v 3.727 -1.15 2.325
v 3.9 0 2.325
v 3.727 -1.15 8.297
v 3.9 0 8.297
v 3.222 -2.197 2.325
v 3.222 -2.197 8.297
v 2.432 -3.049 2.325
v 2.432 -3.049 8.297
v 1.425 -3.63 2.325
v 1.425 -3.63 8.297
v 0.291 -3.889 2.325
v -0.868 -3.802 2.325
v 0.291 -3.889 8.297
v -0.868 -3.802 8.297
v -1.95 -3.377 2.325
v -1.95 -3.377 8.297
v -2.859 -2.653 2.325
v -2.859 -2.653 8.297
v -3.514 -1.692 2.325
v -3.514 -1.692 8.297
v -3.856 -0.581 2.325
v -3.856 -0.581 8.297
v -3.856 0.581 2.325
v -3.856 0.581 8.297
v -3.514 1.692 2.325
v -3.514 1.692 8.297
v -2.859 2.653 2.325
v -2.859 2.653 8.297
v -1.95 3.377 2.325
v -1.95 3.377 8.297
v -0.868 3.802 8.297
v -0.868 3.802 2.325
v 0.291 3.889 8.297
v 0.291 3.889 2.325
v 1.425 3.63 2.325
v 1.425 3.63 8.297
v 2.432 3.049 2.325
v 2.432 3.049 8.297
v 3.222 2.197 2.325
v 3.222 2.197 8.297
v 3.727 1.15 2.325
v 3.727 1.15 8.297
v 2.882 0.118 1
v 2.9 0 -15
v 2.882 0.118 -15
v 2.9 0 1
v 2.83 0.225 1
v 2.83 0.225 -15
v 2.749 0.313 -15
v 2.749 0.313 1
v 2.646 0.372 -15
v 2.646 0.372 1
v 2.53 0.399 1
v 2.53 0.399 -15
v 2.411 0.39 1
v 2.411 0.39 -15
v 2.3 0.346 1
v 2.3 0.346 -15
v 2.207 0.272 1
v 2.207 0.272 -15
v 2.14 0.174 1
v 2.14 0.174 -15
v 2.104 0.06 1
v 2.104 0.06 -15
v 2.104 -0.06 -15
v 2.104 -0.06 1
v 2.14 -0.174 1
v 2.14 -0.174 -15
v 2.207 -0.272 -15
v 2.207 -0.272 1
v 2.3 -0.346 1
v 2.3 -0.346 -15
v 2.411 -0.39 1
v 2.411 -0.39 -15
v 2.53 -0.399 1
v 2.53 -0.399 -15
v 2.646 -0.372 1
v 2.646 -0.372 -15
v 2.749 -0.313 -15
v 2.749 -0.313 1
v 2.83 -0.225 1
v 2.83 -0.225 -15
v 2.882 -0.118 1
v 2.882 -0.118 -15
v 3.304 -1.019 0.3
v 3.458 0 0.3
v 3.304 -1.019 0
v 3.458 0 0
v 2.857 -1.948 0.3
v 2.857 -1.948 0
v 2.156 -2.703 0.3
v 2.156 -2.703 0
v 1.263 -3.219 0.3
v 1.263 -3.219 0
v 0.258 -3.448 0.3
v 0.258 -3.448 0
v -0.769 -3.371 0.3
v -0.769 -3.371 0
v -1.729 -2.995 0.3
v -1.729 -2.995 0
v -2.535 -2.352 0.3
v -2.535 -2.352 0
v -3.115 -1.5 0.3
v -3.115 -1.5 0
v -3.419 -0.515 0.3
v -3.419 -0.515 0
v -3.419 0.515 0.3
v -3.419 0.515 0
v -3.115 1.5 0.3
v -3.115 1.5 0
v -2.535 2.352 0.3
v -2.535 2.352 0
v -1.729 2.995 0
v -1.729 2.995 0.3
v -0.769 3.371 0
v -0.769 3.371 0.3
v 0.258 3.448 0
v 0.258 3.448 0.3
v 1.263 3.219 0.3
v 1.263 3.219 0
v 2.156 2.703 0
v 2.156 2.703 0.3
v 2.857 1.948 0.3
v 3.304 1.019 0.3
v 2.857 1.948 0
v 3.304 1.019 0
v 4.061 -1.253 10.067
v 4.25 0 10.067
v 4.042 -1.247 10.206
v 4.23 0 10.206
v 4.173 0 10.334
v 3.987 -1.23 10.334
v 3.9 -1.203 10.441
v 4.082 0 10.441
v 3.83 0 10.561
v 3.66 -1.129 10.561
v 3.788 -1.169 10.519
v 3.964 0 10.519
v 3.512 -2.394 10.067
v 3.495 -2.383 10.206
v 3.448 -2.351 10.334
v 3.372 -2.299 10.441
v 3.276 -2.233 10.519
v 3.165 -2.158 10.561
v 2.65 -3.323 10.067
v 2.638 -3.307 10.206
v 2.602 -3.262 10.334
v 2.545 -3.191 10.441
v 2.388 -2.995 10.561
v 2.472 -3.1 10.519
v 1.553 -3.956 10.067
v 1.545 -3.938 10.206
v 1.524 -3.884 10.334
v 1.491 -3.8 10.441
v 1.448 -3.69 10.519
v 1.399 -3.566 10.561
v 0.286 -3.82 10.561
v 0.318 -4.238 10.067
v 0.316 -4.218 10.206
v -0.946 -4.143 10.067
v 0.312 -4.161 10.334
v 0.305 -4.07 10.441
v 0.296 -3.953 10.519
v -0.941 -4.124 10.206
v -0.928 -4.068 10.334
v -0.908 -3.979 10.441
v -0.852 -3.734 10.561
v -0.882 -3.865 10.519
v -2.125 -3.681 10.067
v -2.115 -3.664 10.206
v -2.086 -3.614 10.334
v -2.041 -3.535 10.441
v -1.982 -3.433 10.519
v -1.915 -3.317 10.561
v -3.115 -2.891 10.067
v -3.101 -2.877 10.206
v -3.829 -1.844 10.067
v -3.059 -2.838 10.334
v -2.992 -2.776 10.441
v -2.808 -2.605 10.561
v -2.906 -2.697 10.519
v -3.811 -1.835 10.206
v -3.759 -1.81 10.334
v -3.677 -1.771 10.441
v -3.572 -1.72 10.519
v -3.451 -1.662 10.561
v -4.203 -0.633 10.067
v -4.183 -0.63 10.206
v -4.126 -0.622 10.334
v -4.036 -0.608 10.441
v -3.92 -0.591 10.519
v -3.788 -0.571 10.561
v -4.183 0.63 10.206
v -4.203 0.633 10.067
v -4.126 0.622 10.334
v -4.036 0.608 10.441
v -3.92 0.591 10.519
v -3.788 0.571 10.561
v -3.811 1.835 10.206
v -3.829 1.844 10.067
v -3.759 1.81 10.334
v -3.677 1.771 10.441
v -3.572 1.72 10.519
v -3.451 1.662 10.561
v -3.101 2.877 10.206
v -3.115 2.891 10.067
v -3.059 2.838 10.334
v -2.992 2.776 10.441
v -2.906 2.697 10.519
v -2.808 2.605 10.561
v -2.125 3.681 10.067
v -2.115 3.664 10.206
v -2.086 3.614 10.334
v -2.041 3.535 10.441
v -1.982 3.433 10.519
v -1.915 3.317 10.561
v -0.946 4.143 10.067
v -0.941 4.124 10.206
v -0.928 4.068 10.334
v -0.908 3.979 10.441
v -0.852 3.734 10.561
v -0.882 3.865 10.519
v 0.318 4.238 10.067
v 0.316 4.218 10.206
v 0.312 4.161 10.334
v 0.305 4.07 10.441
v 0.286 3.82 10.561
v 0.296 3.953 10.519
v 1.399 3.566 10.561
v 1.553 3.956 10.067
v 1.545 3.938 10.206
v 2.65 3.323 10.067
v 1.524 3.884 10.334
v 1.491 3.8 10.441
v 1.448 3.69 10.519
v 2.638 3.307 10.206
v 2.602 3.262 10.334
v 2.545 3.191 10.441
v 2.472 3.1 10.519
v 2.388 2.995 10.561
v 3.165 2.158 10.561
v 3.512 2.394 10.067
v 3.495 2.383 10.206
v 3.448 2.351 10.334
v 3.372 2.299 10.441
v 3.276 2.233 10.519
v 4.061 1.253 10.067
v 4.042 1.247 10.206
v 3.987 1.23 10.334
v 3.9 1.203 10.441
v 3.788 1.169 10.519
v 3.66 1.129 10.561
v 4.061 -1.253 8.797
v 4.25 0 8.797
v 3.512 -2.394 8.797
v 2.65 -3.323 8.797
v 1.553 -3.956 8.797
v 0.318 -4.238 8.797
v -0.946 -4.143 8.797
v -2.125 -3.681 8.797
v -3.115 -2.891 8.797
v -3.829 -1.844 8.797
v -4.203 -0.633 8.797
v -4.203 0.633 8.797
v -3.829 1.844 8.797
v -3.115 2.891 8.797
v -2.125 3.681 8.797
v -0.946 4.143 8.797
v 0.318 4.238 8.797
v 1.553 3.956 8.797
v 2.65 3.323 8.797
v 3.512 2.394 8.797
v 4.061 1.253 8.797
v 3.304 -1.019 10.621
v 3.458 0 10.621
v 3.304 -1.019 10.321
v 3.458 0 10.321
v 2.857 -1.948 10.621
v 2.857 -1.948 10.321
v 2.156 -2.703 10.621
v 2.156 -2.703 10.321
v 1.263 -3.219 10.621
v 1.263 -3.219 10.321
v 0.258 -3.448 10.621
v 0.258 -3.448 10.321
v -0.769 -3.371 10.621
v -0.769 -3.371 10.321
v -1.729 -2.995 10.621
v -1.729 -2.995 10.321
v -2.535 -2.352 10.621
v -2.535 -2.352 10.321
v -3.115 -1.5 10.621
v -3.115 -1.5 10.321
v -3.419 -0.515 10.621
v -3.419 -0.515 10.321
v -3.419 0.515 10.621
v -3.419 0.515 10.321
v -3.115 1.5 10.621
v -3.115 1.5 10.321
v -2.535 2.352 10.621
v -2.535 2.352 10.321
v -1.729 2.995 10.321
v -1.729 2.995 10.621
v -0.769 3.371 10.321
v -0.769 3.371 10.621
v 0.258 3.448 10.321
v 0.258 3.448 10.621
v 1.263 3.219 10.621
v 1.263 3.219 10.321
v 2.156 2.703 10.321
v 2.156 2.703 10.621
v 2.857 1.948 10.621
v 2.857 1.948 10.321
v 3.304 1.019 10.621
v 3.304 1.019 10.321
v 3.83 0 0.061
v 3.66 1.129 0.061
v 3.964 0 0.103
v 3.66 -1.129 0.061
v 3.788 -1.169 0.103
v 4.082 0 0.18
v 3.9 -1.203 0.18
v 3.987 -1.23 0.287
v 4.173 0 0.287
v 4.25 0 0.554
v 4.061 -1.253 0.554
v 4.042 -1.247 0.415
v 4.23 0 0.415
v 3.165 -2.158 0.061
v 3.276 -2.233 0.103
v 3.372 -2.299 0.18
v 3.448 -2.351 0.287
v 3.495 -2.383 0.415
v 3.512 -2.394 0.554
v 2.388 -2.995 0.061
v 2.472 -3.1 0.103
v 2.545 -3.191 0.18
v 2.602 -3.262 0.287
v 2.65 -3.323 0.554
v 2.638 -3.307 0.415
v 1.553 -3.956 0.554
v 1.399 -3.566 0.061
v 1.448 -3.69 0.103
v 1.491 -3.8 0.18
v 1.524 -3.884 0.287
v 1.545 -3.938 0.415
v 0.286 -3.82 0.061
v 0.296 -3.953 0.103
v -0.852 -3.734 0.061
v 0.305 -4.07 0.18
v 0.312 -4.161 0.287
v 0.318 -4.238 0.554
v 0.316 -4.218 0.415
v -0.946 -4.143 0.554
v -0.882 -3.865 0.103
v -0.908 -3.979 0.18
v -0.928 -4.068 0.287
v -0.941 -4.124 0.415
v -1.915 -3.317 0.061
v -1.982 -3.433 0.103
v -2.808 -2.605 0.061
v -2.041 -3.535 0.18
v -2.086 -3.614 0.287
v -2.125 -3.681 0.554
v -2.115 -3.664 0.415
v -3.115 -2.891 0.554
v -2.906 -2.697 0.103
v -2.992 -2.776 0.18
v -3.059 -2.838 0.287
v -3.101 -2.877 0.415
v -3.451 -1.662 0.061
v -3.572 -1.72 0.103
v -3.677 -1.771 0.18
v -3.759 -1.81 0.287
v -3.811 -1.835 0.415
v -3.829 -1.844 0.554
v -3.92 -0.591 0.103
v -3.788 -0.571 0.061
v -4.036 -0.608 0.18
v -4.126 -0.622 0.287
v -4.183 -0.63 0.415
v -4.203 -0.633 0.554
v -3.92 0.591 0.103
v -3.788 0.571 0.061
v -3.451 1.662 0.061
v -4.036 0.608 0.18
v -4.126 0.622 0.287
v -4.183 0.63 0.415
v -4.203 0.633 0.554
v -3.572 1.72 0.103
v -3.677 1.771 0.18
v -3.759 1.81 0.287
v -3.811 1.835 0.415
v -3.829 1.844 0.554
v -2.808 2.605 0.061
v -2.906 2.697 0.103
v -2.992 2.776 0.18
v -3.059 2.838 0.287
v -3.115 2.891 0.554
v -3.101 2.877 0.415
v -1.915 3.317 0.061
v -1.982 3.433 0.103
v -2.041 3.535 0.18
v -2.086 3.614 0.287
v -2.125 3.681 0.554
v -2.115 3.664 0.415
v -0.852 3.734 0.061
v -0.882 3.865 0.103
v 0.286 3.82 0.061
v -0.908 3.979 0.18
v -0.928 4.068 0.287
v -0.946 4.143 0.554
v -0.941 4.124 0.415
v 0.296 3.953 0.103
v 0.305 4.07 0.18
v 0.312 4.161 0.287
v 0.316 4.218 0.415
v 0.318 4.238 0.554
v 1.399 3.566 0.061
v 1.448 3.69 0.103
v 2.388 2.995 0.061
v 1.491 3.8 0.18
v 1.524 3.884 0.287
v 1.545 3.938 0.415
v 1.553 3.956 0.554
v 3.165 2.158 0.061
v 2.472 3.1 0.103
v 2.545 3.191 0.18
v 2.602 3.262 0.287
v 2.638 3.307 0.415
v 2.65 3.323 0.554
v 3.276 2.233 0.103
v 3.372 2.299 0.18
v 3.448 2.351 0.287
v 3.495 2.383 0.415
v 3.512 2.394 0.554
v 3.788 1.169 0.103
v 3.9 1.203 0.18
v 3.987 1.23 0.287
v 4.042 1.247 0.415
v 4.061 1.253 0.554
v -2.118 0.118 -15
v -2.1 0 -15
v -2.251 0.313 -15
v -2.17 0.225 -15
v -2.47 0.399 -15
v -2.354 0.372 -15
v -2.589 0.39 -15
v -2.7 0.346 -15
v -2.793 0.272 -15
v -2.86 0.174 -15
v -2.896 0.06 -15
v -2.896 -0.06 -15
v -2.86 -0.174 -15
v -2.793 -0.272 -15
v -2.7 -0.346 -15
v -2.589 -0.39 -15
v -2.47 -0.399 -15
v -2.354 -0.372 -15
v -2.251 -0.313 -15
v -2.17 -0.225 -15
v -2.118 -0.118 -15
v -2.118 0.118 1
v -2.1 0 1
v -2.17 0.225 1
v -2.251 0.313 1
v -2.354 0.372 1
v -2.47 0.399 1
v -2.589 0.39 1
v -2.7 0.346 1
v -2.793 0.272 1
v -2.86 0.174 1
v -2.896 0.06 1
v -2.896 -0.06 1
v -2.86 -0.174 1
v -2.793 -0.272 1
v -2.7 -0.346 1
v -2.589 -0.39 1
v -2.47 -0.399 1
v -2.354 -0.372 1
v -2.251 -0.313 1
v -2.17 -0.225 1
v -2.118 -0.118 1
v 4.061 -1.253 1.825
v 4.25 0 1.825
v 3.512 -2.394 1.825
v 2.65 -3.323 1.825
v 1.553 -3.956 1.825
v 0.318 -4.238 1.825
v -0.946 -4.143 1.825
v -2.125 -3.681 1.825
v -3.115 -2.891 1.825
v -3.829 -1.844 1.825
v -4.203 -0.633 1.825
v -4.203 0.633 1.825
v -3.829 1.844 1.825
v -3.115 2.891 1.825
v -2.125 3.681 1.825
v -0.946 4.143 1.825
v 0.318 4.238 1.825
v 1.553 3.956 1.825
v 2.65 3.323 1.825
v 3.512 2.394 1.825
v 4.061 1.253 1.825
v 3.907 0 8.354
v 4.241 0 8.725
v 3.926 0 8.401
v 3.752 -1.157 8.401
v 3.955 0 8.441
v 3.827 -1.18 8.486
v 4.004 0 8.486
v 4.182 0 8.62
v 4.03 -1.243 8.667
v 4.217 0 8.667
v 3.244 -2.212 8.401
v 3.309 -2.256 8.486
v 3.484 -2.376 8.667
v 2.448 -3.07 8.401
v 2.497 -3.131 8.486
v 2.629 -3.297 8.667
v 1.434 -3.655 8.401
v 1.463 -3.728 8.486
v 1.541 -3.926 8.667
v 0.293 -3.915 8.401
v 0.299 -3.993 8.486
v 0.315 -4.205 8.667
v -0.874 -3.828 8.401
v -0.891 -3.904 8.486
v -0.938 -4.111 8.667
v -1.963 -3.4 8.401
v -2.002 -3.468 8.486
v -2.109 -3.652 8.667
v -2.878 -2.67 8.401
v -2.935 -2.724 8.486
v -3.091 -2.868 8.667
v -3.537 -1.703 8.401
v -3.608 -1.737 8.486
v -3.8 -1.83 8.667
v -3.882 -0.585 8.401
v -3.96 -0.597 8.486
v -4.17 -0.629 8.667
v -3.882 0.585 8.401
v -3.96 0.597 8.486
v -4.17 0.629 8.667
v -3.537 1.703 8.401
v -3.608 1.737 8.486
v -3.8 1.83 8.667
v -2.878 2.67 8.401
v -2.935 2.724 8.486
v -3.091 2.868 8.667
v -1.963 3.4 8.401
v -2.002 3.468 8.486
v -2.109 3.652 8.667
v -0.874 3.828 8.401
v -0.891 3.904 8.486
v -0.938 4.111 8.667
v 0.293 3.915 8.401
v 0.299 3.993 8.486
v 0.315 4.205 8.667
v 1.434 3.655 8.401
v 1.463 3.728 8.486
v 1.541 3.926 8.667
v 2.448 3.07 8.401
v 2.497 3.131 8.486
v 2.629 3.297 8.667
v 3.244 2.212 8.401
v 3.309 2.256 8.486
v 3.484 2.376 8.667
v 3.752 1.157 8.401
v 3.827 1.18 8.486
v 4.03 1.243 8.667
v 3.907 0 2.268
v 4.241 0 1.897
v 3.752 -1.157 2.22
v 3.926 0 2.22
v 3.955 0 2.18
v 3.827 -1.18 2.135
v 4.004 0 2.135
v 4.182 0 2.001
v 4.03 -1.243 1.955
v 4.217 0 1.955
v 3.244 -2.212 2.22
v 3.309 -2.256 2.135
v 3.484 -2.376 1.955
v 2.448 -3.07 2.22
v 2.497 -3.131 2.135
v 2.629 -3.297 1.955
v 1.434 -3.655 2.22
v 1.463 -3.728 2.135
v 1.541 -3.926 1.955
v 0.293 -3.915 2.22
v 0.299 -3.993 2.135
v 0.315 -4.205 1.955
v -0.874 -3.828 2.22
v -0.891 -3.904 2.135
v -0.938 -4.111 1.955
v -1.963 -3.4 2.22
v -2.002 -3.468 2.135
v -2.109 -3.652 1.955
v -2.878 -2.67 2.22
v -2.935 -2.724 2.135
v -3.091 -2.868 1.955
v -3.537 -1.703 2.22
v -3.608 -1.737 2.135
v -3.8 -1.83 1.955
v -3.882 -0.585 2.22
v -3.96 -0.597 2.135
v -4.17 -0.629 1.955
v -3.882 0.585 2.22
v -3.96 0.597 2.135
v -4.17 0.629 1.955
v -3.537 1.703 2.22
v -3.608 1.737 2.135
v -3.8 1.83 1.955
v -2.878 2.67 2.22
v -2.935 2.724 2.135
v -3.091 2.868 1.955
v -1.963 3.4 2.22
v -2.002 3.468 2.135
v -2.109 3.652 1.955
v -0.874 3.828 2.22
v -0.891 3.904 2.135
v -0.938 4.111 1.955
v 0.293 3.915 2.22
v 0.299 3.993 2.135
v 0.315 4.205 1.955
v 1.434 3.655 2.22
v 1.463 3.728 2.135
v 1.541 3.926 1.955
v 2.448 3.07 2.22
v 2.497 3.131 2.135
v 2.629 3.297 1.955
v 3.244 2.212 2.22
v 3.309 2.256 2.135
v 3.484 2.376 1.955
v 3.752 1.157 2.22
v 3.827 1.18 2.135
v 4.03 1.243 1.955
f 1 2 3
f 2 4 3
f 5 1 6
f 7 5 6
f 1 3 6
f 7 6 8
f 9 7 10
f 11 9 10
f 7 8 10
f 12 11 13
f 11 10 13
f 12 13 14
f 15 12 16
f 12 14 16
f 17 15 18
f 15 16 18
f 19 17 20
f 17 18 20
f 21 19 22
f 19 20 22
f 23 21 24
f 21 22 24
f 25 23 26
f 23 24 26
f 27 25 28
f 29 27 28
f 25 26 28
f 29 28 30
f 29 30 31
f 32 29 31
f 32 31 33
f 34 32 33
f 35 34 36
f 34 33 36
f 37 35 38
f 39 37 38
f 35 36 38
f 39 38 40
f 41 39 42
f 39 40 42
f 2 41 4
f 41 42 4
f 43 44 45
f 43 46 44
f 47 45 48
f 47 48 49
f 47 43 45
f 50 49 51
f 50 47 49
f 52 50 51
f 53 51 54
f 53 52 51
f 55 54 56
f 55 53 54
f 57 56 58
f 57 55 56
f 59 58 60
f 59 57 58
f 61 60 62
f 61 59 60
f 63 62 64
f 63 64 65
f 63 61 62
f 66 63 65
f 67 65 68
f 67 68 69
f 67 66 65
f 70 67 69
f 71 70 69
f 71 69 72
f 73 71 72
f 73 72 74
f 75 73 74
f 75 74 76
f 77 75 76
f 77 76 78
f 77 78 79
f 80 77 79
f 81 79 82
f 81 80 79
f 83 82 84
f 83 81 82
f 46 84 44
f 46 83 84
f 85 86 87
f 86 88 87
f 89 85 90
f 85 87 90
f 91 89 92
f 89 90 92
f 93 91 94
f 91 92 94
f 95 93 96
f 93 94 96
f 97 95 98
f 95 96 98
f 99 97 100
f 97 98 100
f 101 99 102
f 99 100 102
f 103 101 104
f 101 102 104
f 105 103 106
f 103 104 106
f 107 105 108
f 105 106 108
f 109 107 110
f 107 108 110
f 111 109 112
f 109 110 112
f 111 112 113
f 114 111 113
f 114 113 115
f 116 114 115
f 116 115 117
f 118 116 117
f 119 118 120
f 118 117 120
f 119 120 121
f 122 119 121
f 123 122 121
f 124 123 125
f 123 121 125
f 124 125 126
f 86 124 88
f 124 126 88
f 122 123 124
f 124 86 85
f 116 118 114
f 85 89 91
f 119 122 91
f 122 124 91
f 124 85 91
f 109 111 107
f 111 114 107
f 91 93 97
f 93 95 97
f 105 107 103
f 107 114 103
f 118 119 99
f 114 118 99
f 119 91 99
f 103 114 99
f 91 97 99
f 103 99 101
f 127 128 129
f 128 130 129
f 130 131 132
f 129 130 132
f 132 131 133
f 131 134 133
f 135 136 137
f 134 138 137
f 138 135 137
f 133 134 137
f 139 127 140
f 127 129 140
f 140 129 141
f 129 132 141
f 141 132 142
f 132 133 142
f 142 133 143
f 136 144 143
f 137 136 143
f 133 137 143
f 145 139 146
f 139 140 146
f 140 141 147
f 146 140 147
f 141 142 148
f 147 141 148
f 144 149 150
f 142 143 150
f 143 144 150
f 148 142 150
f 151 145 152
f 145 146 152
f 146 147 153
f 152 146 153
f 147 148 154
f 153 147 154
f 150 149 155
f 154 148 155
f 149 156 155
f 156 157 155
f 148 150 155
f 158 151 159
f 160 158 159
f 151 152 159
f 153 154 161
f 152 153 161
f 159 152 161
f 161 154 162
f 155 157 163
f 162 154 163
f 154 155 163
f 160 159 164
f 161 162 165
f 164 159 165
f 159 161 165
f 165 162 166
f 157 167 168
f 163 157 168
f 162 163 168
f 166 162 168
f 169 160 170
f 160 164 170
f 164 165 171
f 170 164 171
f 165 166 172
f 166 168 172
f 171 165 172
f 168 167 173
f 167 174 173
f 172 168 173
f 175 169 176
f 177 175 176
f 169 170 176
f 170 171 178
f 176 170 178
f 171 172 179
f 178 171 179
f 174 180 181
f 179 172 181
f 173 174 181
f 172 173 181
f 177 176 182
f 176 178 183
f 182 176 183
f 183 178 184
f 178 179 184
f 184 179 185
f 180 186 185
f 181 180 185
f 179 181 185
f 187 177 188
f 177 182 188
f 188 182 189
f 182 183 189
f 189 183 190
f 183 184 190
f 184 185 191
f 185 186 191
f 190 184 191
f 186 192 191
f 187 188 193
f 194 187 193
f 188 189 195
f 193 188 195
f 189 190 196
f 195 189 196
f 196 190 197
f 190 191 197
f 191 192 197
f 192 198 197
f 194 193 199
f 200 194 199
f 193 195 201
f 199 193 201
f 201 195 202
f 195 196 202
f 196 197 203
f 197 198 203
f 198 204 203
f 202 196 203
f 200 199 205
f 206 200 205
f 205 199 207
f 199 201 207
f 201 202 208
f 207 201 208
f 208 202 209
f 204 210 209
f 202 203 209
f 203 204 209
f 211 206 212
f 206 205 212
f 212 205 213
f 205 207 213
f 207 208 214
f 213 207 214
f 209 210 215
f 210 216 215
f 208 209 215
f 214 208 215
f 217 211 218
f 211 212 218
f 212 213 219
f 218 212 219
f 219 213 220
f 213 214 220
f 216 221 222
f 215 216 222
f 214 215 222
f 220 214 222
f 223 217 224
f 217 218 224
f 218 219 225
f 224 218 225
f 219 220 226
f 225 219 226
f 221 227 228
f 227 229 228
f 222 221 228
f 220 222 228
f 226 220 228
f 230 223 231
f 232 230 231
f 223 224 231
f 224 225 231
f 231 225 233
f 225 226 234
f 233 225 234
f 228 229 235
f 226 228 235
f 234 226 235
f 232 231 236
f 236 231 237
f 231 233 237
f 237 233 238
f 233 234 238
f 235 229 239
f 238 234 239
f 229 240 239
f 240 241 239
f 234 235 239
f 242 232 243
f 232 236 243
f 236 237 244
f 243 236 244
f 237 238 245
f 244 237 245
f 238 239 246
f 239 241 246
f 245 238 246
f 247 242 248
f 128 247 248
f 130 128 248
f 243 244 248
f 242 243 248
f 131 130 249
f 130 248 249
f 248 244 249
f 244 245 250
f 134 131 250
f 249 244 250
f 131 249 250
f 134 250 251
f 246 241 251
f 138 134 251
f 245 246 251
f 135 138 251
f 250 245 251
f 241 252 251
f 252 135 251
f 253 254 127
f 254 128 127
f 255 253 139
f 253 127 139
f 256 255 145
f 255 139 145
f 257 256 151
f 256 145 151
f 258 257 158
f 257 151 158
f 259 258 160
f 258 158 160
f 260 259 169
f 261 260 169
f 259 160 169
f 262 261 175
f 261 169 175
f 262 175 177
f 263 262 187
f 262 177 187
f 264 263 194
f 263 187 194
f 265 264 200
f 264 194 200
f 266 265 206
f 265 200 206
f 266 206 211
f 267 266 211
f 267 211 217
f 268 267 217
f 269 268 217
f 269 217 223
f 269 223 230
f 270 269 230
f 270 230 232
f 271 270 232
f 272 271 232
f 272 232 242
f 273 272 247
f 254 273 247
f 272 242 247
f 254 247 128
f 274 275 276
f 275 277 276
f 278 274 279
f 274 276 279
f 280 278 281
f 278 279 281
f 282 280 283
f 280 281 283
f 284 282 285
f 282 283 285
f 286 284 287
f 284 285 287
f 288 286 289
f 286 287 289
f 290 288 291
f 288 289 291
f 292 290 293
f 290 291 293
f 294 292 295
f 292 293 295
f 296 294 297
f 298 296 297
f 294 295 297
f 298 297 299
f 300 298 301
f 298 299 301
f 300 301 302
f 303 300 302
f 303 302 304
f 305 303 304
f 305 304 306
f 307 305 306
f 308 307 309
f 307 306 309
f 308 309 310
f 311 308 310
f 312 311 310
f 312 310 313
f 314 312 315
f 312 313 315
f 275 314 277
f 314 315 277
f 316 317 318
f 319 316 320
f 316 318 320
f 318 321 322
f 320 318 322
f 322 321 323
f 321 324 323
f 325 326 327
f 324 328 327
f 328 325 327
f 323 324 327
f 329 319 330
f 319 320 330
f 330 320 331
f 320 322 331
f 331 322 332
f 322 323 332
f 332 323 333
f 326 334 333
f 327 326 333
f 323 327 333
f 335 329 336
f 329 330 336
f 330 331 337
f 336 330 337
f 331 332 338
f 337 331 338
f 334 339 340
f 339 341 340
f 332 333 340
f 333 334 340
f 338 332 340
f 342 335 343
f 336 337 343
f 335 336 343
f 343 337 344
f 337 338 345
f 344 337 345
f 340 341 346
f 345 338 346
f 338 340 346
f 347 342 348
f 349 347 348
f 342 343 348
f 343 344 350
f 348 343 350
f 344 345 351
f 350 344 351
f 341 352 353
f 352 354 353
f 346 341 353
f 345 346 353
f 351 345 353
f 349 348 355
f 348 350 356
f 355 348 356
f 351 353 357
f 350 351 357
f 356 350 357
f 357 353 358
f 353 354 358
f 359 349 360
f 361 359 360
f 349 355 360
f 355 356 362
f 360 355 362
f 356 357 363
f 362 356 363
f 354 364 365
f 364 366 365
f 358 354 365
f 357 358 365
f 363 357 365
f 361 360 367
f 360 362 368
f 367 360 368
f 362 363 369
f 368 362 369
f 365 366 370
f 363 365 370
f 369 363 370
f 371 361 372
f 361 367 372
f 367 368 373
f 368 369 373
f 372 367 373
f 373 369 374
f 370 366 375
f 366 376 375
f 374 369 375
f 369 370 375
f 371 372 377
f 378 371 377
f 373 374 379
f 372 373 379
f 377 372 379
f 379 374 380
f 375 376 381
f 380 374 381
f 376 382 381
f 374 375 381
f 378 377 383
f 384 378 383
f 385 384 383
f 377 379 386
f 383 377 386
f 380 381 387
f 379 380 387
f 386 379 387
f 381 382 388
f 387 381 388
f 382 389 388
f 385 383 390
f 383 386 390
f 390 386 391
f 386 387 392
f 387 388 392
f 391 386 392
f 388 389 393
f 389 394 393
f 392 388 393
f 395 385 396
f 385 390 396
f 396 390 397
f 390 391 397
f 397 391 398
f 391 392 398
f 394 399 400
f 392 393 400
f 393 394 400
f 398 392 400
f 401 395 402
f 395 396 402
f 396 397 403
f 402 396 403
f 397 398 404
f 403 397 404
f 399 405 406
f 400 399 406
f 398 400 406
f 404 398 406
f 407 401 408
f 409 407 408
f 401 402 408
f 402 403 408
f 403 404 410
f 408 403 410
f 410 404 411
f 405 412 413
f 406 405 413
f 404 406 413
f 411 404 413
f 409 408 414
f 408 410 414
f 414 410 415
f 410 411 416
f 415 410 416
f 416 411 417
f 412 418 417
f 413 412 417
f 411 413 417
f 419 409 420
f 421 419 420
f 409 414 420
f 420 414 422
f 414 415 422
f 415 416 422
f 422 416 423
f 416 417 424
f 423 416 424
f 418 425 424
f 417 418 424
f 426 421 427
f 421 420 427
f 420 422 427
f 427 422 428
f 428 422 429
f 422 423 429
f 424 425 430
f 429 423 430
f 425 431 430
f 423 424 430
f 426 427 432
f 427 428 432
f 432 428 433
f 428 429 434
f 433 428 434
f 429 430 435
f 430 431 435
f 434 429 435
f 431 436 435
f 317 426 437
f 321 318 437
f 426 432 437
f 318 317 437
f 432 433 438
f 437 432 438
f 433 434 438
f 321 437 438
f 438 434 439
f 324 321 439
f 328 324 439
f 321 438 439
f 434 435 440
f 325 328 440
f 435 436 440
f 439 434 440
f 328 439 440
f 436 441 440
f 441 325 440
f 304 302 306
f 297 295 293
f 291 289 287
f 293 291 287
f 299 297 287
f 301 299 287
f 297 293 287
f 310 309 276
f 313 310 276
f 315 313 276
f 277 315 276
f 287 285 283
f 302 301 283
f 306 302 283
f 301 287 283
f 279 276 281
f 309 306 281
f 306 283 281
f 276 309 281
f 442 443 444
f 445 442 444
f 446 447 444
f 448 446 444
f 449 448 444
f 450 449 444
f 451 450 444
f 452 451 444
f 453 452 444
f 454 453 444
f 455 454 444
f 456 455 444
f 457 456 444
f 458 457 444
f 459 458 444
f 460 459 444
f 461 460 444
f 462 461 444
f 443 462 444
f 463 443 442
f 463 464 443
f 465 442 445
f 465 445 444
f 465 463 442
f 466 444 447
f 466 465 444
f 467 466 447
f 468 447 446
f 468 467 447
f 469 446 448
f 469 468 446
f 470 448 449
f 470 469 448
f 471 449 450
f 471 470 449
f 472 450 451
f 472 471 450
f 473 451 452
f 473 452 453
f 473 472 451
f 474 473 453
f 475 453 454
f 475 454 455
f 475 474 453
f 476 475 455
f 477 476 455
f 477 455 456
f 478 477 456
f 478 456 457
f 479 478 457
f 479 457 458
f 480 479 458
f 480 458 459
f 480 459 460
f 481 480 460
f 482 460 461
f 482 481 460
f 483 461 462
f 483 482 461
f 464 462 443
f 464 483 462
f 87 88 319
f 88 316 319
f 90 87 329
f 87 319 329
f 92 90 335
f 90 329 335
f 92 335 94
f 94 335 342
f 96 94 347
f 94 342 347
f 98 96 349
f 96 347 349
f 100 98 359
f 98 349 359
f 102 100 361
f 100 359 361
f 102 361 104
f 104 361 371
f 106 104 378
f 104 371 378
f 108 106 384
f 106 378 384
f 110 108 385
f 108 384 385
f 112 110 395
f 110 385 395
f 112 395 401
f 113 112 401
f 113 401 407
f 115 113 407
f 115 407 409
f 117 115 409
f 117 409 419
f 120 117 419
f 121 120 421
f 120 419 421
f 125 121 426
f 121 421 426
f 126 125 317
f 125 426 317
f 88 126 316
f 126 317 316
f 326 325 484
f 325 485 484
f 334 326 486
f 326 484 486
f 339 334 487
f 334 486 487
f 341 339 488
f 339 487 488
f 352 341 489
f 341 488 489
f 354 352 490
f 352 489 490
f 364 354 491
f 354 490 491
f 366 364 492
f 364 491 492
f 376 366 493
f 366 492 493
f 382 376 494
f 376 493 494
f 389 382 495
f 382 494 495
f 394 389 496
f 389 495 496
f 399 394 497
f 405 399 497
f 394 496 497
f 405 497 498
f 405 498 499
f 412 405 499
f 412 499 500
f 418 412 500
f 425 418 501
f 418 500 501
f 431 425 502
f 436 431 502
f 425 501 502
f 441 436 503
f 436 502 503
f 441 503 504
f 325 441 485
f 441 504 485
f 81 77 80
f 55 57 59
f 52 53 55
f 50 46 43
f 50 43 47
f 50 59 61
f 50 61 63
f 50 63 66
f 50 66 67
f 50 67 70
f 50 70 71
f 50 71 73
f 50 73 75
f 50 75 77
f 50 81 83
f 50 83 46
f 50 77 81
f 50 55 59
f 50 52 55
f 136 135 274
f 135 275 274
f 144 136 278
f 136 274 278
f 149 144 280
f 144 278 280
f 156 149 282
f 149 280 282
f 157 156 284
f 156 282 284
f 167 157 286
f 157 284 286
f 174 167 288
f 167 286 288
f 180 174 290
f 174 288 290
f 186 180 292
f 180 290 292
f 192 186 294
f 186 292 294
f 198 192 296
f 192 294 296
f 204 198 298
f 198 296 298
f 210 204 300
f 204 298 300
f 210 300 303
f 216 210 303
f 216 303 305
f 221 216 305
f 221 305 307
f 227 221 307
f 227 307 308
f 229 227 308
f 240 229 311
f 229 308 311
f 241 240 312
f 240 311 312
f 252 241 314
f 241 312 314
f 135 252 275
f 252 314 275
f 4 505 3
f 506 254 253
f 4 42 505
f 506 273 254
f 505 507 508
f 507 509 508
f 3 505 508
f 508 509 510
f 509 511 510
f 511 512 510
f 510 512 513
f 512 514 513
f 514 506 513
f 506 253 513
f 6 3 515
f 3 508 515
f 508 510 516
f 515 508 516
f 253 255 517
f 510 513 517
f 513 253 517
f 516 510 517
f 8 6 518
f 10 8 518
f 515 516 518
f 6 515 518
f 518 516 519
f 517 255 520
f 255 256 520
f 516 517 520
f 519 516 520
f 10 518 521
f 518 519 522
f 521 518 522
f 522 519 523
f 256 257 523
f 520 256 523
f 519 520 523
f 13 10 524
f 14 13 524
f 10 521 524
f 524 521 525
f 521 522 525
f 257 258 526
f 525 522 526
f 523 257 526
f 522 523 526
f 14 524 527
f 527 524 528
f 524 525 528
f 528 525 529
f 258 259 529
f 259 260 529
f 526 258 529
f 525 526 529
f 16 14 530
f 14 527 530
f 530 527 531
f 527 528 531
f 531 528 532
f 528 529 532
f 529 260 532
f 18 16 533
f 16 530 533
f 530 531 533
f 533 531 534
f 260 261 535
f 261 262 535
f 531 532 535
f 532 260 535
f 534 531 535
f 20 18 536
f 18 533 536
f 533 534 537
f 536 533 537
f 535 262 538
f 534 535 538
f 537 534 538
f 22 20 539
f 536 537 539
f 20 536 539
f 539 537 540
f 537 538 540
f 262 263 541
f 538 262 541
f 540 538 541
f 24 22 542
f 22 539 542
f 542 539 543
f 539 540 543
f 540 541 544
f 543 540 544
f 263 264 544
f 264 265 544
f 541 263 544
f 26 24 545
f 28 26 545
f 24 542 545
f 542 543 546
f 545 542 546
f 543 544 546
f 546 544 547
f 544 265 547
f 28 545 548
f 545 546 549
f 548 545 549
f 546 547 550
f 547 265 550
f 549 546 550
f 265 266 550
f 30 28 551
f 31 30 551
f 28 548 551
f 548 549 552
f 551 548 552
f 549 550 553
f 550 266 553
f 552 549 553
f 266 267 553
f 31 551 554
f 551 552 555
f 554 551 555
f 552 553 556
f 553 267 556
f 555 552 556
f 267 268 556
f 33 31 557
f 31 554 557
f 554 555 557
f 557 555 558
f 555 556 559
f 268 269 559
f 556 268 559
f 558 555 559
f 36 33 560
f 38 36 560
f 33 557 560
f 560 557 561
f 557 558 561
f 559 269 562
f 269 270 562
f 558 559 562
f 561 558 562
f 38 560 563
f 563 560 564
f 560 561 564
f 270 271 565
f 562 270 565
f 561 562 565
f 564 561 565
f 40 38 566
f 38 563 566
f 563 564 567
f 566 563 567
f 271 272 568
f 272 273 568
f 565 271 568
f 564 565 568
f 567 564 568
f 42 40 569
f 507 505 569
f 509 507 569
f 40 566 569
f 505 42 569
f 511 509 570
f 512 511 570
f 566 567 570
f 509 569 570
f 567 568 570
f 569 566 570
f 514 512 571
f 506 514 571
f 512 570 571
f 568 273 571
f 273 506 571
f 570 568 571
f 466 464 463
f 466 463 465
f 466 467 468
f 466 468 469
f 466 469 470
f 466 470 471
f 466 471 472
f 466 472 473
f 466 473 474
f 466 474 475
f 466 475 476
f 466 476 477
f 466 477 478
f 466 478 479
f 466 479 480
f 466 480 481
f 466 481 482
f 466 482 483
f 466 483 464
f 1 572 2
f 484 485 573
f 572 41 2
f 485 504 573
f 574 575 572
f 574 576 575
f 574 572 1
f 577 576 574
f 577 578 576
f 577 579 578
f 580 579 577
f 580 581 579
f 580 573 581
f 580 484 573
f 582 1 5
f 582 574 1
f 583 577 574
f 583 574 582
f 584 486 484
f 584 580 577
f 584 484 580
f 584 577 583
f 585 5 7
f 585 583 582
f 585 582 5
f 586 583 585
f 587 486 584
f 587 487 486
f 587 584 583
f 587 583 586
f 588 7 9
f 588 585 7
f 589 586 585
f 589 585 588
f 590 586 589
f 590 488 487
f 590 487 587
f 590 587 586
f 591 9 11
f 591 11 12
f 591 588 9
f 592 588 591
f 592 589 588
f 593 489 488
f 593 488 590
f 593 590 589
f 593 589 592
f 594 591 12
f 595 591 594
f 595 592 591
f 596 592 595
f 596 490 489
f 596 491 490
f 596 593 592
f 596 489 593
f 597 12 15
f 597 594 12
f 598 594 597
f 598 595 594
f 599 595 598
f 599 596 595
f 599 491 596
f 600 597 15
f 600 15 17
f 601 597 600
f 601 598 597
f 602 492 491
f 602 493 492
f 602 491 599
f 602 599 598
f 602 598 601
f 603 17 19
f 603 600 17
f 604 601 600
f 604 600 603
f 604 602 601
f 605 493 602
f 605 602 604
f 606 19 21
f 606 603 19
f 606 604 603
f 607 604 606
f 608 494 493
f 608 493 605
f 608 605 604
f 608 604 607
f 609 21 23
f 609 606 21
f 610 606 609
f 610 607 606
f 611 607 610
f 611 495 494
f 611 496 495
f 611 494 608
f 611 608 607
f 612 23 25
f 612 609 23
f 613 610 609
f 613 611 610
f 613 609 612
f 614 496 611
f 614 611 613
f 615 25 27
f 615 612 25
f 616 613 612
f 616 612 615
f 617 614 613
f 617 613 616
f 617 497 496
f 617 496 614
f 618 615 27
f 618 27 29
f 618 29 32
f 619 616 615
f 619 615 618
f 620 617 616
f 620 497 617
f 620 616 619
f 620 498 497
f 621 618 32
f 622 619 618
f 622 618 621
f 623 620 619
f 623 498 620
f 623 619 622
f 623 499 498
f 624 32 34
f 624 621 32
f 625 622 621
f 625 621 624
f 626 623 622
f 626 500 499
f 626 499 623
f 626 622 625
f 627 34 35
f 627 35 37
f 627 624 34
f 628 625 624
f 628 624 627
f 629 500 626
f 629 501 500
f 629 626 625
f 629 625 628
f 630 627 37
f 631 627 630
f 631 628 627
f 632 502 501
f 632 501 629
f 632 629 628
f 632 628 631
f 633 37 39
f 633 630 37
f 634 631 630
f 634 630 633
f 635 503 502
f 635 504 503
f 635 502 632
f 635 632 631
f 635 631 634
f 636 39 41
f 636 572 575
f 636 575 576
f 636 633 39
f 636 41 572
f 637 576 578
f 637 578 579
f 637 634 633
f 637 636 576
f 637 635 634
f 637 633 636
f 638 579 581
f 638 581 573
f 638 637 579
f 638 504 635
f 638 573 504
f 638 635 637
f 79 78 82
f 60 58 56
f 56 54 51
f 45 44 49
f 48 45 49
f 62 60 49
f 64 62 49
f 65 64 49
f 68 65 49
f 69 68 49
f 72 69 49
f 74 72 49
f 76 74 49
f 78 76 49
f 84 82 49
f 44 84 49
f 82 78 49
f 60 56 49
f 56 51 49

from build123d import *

# Parameters (mm, degrees)
F1_R          = 0.4
F2_DEPTH      = 1
F2_DEPTH_BACK = 15


with BuildPart() as f2:
    # F1 (on Top) → F2 (new body, two sides)
    with BuildSketch(Plane.XY) as f2_sk:
        with Locations((-2.5, 0)):
            Circle(F1_R)
    extrude(amount=F2_DEPTH)
    extrude(f2_sk.sketch, amount=-F2_DEPTH_BACK)


with BuildPart() as f2b:
    # F1 (on Top) → F2, piece 2 (new body, two sides)
    with BuildSketch(Plane.XY) as f2_2_sk:
        with BuildLine():
            ThreePointArc((2.1, 0), (2.5, -0.4), (2.9, 0))
            ThreePointArc((2.9, 0), (2.5, 0.4), (2.1, 0))
        make_face()
    extrude(amount=F2_DEPTH)
    extrude(f2_2_sk.sketch, amount=-F2_DEPTH_BACK)


with BuildPart() as f3:
    # F0 (on Front) → F3 (revolve)
    with BuildSketch(Plane.XZ):
        with BuildLine():
            Line((3.4578109179, 10.3214318706), (0, 10.3214318706))
            Line((0, 10.3214318706), (0, 5.3107159353))
            Line((0, 5.3107159353), (3.9, 5.3107159353))
            Line((3.9, 5.3107159353), (3.9, 8.2966128872))
            add(Edge.make_bspline(
                [(3.9, 8.2966128872), (3.9001910482, 8.54726322), (4.2516529998, 8.5184304044), (4.25, 8.7966128872)],
                knots=[0, 0, 0, 0, 0.6103277808, 0.6103277808, 0.6103277808, 0.6103277808], degree=3))
            Line((4.25, 8.7966128872), (4.25, 10.0672248083))
            ThreePointArc((4.25, 10.0672248083), (4.1309247296, 10.391101869), (3.8304145984, 10.5607159353))
            Line((3.8304145984, 10.5607159353), (3.4578109179, 10.6214318706))
            Line((3.4578109179, 10.6214318706), (3.4578109179, 10.3214318706))
        make_face()
        with BuildLine():
            Line((3.9, 5.3107159353), (0, 5.3107159353))
            Line((0, 5.3107159353), (0, 0.3))
            Line((0, 0.3), (3.4578109179, 0.3))
            Line((3.4578109179, 0.3), (3.4578109179, 0))
            Line((3.4578109179, 0), (3.8304145984, 0.0607159353))
            ThreePointArc((3.8304145984, 0.0607159353), (4.1309247296, 0.2303300016), (4.25, 0.5542070622))
            Line((4.25, 0.5542070622), (4.25, 1.8248189834))
            add(Edge.make_bspline(
                [(3.9, 2.3248189834), (3.9001910482, 2.0741686506), (4.2516529998, 2.1030014662), (4.25, 1.8248189834)],
                knots=[0, 0, 0, 0, 0.6103277808, 0.6103277808, 0.6103277808, 0.6103277808], degree=3))
            Line((3.9, 2.3248189834), (3.9, 5.3107159353))
        make_face()
    revolve(axis=Axis((0, 0, 7.8160739029), (0, 0, -1)))


solid = Compound([f2.part, f2b.part, f3.part])
